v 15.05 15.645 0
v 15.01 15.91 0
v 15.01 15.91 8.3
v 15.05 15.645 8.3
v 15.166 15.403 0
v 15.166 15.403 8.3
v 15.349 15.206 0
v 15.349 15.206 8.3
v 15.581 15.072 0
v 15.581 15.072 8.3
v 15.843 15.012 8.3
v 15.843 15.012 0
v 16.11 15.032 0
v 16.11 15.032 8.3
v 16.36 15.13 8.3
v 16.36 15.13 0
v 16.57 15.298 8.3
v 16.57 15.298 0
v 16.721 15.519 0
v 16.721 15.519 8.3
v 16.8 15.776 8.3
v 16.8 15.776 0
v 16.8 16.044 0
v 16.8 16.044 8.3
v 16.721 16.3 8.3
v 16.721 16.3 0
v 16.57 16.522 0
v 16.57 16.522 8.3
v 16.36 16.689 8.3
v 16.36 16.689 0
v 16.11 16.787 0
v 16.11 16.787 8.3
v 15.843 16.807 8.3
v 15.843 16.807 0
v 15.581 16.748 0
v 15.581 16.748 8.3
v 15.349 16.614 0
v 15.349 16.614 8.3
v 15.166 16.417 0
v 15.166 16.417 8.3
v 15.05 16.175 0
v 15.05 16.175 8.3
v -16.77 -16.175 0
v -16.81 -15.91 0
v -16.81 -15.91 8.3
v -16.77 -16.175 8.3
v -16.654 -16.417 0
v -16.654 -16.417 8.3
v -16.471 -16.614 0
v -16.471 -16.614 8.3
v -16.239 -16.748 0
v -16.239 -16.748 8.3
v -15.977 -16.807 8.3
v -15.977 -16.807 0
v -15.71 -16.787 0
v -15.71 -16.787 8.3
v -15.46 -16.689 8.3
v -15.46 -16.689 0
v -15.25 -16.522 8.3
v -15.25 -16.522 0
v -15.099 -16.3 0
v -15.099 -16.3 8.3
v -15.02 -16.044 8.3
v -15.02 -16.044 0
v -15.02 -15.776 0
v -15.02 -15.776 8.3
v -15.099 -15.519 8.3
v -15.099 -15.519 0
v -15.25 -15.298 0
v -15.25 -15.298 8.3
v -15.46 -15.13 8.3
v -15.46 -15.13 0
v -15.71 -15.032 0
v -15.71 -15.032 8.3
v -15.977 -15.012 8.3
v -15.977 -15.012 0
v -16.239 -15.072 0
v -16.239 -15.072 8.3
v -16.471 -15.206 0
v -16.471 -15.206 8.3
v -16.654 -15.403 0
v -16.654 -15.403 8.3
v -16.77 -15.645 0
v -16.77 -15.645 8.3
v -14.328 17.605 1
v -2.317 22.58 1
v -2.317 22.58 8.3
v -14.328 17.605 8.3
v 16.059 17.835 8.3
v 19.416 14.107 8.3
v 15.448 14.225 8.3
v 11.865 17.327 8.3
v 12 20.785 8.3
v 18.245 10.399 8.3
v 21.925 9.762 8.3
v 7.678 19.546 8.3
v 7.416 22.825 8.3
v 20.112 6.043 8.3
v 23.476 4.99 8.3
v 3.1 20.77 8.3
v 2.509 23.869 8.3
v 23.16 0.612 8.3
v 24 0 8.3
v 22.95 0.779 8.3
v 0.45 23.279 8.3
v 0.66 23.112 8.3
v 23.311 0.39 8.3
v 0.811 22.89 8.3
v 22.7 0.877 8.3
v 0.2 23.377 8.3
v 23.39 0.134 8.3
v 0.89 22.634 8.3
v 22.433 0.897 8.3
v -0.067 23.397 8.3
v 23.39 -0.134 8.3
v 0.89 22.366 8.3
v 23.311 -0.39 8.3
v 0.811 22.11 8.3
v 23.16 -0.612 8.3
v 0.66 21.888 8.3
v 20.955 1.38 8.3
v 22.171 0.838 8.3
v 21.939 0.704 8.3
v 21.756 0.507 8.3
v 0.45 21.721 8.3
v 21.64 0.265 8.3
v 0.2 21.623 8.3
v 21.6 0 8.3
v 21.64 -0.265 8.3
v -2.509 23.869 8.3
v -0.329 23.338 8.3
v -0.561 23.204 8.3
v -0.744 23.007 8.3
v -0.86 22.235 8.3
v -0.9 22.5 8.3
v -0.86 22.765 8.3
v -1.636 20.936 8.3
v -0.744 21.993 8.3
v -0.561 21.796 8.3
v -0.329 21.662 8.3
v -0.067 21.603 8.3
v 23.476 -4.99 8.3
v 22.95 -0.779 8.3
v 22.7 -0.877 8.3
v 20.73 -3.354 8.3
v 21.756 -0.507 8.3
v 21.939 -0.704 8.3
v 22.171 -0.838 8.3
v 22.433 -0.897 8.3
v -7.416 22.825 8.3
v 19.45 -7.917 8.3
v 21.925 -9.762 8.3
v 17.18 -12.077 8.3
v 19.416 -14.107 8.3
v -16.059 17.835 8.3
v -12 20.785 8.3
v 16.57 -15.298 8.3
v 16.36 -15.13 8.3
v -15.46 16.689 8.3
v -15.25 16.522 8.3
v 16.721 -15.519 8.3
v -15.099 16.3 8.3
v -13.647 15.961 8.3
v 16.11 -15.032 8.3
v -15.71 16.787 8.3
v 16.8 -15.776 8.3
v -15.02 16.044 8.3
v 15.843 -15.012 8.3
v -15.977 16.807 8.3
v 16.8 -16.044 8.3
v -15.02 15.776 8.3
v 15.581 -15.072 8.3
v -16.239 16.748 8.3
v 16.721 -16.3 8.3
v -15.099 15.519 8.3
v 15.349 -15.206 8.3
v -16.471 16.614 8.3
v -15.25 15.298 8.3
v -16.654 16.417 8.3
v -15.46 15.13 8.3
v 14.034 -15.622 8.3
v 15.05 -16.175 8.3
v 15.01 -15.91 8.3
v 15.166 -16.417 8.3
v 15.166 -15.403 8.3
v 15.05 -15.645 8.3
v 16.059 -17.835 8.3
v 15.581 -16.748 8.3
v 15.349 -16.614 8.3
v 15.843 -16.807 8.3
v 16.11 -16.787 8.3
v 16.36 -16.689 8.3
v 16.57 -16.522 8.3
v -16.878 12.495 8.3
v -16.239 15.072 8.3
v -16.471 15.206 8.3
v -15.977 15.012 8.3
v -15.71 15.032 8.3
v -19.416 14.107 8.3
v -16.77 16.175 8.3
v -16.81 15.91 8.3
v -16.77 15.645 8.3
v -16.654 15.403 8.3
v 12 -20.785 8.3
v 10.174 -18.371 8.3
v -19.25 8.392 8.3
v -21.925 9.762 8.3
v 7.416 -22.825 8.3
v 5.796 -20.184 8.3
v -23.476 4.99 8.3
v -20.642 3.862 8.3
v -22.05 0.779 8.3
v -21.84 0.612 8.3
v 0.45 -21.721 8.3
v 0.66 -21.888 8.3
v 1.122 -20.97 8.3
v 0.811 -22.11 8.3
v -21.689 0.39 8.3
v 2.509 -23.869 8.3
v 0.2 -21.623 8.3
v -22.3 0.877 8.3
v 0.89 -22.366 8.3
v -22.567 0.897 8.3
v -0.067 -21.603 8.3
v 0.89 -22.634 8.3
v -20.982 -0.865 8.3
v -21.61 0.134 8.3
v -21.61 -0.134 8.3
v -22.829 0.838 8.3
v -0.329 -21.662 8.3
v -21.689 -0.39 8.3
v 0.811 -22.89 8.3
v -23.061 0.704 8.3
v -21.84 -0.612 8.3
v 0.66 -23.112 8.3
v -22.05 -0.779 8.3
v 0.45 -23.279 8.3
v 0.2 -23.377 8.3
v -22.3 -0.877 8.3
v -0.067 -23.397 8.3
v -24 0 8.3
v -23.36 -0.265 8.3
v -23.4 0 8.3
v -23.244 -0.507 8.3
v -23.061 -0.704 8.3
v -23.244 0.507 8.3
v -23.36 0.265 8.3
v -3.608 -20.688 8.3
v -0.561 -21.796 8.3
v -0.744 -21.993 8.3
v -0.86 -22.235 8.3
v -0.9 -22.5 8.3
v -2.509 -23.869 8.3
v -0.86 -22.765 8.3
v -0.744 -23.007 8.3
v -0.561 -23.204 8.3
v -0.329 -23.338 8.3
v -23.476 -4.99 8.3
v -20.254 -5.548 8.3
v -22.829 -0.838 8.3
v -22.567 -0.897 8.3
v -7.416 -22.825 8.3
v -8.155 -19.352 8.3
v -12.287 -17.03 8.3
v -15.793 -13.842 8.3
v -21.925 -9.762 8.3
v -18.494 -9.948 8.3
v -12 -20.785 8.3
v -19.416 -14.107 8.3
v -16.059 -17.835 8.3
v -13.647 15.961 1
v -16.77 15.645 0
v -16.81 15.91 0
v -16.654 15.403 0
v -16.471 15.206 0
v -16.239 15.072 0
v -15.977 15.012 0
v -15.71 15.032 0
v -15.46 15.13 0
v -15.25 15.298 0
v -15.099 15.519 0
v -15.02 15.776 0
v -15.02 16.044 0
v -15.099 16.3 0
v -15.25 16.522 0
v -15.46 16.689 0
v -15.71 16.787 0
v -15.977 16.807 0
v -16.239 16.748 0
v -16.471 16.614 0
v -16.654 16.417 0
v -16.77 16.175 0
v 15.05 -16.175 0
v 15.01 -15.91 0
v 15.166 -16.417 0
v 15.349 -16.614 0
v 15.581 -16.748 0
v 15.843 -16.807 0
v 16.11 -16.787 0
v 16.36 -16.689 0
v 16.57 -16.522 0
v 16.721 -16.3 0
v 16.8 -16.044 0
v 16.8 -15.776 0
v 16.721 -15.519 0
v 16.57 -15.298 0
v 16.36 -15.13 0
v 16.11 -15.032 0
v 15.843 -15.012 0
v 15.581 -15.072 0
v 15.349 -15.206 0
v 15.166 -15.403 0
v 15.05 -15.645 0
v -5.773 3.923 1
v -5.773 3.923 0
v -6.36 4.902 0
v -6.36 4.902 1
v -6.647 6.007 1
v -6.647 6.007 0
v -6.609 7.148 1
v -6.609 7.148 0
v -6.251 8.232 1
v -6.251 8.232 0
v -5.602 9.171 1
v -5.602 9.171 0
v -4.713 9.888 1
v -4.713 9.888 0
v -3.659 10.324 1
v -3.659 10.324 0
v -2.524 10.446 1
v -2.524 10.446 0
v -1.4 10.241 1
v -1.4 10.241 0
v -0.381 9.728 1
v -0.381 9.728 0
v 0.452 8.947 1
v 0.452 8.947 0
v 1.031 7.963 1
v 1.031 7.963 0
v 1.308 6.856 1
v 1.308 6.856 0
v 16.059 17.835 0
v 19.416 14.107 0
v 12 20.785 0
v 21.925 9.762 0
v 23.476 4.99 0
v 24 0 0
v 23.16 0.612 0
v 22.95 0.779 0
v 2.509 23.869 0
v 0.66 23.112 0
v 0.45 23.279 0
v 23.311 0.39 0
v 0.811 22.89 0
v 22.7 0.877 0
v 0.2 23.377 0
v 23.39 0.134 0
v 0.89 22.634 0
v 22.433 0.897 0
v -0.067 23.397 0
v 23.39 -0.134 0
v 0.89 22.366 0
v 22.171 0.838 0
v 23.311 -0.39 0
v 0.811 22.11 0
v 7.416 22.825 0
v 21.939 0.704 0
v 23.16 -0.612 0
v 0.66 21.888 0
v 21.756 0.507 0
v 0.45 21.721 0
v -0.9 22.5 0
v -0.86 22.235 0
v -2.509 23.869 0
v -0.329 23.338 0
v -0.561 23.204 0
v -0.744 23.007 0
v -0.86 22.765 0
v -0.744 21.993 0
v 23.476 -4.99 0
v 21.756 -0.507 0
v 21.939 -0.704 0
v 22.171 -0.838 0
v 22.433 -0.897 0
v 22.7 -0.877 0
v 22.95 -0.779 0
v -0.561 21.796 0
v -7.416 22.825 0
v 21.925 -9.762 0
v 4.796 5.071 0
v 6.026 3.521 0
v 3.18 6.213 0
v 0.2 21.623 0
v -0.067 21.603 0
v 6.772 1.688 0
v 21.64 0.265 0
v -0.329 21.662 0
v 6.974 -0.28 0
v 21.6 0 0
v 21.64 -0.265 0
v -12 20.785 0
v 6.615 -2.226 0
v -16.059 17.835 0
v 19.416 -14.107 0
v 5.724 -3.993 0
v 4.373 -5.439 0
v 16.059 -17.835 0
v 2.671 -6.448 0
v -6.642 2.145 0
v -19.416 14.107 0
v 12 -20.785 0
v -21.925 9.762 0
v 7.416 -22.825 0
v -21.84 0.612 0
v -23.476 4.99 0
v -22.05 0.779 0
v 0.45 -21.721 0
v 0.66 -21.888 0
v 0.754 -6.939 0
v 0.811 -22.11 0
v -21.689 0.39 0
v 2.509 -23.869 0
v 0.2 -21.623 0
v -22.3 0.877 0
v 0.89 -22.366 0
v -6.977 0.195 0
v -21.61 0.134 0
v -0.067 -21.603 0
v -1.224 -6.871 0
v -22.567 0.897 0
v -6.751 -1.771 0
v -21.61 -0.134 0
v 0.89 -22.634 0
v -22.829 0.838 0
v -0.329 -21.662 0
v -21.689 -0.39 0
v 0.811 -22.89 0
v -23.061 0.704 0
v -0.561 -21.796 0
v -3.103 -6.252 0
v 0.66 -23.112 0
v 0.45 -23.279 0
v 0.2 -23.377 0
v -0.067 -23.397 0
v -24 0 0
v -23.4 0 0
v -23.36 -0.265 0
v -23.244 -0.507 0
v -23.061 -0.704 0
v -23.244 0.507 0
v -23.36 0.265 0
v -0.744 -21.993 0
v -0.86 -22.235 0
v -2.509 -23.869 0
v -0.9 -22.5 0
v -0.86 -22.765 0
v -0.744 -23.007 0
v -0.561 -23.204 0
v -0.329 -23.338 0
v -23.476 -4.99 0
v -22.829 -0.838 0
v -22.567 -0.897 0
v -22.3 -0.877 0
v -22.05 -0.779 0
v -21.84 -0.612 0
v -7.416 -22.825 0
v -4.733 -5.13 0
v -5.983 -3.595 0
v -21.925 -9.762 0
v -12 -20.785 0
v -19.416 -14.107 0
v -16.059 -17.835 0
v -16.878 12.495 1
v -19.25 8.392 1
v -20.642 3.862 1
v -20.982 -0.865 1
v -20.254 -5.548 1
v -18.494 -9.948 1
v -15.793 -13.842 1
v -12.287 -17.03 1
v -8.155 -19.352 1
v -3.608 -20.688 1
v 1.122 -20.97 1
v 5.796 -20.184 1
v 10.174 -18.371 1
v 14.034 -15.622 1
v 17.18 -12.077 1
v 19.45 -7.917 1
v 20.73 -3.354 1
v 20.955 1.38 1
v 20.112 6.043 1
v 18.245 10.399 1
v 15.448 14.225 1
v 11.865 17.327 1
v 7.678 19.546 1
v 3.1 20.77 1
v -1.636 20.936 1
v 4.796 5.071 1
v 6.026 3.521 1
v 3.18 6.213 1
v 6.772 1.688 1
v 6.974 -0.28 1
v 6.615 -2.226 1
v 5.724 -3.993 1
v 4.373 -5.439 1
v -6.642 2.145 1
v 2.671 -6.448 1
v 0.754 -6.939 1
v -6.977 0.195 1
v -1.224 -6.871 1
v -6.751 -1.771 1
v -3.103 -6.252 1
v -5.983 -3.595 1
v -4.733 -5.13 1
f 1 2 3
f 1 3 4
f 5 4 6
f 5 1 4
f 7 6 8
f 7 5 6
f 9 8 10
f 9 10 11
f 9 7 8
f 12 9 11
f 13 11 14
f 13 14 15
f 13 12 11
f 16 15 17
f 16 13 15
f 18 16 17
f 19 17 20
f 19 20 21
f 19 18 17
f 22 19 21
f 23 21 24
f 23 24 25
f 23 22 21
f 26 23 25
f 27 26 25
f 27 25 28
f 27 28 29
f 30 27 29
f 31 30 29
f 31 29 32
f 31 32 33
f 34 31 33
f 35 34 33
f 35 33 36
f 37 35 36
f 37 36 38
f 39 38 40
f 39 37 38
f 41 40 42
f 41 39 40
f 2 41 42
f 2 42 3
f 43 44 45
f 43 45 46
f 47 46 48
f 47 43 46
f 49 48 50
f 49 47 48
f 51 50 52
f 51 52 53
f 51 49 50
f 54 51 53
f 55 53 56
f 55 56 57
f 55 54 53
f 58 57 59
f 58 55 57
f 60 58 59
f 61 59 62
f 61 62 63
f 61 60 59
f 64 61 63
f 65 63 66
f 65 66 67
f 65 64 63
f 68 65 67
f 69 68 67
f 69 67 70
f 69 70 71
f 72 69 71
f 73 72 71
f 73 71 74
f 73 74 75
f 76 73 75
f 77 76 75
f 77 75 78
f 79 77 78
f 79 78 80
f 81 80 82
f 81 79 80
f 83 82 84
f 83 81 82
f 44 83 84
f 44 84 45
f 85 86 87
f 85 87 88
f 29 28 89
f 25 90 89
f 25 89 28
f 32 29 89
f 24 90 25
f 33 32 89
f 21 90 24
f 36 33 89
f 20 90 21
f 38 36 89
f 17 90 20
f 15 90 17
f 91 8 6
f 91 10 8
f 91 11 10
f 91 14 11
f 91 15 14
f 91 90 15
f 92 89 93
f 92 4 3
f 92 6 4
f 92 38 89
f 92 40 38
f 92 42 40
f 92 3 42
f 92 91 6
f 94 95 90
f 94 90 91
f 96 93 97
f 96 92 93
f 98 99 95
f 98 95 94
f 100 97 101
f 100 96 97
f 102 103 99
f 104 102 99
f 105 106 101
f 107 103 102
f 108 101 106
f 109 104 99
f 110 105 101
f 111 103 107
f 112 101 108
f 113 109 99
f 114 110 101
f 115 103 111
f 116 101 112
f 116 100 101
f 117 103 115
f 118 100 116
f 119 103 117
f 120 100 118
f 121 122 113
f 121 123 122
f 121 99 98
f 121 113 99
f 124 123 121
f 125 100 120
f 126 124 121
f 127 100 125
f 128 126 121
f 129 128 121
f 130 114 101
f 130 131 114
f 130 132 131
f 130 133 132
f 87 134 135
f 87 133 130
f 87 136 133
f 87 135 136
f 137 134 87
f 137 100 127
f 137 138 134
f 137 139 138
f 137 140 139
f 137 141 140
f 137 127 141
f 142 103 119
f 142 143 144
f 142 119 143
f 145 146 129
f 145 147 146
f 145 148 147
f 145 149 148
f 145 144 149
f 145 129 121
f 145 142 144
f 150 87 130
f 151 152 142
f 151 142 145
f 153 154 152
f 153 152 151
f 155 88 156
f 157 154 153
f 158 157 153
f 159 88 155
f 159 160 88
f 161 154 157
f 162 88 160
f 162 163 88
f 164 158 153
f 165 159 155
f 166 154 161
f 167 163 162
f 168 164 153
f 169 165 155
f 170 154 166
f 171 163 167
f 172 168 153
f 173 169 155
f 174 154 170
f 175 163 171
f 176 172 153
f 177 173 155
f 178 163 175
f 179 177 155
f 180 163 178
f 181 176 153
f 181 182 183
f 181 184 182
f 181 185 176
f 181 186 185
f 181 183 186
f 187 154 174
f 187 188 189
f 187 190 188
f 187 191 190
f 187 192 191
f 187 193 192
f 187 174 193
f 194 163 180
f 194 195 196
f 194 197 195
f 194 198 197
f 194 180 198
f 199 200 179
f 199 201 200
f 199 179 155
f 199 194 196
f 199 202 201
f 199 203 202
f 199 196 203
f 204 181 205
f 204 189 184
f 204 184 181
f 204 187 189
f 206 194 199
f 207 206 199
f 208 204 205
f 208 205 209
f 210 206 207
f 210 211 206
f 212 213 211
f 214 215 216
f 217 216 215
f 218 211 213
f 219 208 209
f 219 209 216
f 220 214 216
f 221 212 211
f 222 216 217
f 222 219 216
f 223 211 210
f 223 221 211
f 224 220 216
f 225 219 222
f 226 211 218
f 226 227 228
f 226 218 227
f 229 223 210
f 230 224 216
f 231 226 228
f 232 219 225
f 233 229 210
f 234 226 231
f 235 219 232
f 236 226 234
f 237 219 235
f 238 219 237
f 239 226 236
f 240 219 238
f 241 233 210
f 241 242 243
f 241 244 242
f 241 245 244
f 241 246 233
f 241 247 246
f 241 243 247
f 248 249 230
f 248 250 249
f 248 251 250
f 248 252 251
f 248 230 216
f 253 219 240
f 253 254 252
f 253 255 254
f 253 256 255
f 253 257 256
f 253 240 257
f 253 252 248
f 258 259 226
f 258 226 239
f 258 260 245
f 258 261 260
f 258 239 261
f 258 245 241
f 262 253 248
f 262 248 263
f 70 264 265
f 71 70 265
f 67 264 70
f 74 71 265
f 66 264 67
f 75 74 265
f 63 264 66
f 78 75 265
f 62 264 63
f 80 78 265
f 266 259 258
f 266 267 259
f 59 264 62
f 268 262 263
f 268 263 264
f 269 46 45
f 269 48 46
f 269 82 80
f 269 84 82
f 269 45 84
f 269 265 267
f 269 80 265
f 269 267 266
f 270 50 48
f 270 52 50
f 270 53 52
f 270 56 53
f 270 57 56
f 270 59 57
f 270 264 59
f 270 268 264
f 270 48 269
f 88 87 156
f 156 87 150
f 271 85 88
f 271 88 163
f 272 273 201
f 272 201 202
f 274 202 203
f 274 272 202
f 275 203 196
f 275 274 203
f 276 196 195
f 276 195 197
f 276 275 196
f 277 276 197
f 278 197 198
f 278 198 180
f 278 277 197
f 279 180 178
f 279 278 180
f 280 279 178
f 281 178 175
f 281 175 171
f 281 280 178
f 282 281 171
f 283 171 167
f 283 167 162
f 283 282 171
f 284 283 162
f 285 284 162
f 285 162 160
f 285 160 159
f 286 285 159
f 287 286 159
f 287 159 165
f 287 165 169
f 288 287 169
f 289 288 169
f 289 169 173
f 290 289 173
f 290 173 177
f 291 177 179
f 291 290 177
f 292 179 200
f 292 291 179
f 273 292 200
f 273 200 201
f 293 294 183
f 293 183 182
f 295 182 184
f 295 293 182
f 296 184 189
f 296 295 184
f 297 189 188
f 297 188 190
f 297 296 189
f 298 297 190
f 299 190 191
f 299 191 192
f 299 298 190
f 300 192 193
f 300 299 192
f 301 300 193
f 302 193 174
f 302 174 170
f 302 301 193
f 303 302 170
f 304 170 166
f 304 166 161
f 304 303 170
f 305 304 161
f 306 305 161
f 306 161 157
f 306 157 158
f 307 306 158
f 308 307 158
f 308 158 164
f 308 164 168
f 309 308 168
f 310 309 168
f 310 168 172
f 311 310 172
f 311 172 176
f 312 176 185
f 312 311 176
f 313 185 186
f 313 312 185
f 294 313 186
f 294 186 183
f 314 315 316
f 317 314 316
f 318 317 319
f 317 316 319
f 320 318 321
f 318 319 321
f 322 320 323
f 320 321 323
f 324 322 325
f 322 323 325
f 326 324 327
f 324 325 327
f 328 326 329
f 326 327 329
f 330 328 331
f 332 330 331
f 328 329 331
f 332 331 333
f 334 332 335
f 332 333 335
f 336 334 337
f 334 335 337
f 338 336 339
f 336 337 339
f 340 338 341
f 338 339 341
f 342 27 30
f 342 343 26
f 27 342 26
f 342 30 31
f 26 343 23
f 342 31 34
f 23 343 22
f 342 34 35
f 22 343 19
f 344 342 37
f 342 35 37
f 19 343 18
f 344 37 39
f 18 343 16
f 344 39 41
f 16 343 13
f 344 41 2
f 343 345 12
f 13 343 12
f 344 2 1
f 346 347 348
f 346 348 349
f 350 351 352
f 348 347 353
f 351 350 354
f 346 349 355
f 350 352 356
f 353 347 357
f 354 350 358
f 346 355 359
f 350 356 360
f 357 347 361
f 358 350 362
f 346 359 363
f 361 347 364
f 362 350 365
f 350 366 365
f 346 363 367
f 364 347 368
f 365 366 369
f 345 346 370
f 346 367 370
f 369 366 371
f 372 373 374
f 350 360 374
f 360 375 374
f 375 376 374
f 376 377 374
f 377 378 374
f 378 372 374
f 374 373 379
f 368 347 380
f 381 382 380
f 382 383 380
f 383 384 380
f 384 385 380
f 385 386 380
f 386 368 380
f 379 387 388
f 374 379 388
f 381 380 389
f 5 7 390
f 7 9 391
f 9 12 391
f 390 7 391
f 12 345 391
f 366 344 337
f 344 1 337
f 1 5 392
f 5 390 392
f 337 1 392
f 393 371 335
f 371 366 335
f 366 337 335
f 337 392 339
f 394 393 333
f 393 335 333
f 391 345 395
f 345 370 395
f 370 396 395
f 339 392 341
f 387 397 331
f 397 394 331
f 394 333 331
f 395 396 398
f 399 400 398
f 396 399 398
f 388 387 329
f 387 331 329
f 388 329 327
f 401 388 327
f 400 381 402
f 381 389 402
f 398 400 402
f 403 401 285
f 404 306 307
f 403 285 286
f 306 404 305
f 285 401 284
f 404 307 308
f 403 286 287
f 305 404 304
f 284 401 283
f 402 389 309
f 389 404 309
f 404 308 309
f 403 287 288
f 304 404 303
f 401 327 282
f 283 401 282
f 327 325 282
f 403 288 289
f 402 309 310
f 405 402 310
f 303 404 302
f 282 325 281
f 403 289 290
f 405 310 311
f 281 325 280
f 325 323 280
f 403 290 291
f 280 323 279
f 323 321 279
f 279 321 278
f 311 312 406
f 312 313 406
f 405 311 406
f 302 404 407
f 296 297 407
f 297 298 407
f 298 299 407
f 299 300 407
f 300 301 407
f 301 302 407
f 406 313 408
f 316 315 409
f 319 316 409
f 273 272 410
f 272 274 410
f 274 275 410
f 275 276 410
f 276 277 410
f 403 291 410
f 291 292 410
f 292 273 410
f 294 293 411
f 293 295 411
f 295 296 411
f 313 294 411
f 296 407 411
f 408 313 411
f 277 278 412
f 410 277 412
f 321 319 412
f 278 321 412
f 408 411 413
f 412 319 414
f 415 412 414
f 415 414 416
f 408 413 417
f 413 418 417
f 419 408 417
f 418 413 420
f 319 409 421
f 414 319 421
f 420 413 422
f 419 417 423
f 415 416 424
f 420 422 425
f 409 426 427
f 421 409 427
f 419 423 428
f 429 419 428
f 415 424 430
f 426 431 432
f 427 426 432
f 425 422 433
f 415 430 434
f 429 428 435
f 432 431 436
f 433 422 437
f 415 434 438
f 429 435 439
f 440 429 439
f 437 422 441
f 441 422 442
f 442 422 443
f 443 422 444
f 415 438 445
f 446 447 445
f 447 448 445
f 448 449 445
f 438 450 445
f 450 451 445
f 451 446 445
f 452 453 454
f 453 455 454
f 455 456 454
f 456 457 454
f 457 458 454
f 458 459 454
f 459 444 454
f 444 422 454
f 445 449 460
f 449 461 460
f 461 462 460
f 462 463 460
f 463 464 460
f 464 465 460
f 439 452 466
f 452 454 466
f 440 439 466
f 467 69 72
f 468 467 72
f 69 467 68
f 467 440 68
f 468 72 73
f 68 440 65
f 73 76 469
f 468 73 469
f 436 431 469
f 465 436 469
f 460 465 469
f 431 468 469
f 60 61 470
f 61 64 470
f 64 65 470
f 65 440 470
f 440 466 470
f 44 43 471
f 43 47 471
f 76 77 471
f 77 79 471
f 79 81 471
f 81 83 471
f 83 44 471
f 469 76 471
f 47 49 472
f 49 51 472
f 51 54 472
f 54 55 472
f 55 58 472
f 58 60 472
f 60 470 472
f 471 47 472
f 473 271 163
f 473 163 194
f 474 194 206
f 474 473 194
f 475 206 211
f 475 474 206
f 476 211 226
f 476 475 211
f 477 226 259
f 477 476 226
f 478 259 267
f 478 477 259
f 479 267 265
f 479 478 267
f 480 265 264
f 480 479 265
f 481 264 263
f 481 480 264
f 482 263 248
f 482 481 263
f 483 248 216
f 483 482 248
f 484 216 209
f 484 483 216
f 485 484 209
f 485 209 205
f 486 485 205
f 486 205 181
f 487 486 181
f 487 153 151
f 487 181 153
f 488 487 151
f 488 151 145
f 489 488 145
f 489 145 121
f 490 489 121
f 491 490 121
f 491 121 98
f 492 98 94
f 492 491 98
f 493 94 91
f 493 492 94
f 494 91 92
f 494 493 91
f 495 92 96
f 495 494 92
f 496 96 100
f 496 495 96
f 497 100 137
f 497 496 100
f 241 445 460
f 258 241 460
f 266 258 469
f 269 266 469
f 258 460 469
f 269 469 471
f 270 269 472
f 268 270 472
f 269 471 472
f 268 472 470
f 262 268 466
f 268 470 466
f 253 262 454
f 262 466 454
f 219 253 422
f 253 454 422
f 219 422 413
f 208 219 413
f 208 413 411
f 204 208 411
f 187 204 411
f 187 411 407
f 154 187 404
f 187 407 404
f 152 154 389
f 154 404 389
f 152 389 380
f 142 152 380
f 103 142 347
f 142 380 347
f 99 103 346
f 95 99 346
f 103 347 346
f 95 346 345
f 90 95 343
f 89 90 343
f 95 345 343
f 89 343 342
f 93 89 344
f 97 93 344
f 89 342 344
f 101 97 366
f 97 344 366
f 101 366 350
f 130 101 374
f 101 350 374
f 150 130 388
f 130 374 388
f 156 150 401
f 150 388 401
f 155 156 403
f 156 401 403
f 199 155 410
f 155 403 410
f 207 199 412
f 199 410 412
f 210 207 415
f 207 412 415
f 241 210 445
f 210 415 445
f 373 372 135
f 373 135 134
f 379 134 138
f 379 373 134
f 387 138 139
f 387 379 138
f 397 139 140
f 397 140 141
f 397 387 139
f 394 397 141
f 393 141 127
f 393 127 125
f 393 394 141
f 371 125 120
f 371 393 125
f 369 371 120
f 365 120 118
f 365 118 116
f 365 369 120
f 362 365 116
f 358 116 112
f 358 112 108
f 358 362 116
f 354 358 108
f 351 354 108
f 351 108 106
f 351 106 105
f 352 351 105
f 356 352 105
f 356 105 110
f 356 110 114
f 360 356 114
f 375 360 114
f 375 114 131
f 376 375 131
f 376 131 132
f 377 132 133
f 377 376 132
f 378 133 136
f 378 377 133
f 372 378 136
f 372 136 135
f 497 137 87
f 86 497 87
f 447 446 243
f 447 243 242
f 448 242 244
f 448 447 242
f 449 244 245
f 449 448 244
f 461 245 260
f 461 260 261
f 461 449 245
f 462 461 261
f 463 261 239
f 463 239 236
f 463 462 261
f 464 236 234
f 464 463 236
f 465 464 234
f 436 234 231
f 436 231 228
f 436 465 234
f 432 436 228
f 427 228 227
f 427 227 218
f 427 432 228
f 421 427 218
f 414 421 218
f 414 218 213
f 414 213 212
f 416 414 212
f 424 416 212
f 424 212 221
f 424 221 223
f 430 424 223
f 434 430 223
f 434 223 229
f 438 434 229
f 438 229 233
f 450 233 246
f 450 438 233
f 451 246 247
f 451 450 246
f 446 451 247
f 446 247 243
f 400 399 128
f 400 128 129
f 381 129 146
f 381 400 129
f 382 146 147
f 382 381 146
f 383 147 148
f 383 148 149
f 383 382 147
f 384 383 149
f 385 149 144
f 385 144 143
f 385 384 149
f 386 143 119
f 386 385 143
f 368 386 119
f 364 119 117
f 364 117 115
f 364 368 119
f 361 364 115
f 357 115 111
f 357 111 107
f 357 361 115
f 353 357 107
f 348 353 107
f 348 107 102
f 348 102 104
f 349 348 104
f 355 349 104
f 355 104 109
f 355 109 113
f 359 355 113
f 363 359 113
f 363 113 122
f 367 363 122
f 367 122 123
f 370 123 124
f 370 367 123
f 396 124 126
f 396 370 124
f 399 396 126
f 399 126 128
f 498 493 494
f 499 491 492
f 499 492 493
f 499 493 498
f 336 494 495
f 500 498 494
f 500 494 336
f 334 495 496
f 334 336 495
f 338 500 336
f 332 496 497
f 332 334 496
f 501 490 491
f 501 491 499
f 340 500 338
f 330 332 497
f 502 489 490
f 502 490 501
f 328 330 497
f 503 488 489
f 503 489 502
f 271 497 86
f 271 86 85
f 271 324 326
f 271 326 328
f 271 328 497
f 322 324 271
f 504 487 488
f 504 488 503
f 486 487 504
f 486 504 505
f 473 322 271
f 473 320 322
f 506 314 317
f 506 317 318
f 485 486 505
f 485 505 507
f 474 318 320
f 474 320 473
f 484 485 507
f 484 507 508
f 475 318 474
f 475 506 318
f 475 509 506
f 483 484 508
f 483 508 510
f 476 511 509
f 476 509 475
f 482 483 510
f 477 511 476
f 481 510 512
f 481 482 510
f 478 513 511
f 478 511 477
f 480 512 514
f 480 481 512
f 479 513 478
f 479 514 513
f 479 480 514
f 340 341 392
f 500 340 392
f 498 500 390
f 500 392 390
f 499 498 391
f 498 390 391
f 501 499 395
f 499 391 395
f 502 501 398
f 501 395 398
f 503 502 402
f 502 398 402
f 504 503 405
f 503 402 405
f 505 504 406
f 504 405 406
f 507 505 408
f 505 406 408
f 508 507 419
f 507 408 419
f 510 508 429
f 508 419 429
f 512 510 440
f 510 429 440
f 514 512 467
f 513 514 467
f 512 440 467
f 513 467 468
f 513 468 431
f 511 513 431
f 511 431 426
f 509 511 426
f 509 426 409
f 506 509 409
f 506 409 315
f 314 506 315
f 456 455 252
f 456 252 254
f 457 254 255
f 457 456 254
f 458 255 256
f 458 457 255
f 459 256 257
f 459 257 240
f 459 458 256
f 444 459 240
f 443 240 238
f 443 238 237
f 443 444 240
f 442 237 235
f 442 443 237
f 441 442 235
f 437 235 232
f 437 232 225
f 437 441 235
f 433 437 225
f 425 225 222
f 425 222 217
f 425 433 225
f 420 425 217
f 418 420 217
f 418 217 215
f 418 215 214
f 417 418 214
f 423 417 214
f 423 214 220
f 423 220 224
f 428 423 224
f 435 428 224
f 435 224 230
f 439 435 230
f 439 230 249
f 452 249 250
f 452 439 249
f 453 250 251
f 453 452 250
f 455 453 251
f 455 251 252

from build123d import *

# Parameters (mm, degrees)
ESQUISSE1_R             = 24
ESQUISSE1_R_2           = 21
ESQUISSE1_R_3           = 0.9
BOSS_EXTRU_1_DEPTH      = 8.3
ESQUISSE2_R             = 21
BOSS_EXTRU_2_DEPTH      = 1
ENL_V_MAT_EXTRU_1_DEPTH = 35.941236383
ENL_V_MAT_EXTRU_2_DEPTH = 35.71728676


with BuildPart() as part:
    # Esquisse1 → Boss.-Extru.1 (new body)
    with BuildSketch(Plane.XY):
        with Locations(Location((0, 0, 0), (0, 0, 180))):
            Circle(ESQUISSE1_R)
        with Locations(Location((0, 0, 0), (0, 0, 180))):
            Circle(ESQUISSE1_R_2, mode=Mode.SUBTRACT)
        with Locations(Location((22.5, 0, 0), (0, 0, 180))):
            Circle(ESQUISSE1_R_3, mode=Mode.SUBTRACT)
        with Locations(Location((15.909902577, -15.909902577, 0), (0, 0, 180))):
            Circle(ESQUISSE1_R_3, mode=Mode.SUBTRACT)
        with Locations(Location((0, -22.5, 0), (0, 0, 180))):
            Circle(ESQUISSE1_R_3, mode=Mode.SUBTRACT)
        with Locations(Location((-15.909902577, -15.909902577, 0), (0, 0, 180))):
            Circle(ESQUISSE1_R_3, mode=Mode.SUBTRACT)
        with Locations(Location((-22.5, 0, 0), (0, 0, 180))):
            Circle(ESQUISSE1_R_3, mode=Mode.SUBTRACT)
        with Locations(Location((-15.909902577, 15.909902577, 0), (0, 0, 180))):
            Circle(ESQUISSE1_R_3, mode=Mode.SUBTRACT)
        with Locations(Location((0, 22.5, 0), (0, 0, 180))):
            Circle(ESQUISSE1_R_3, mode=Mode.SUBTRACT)
        with Locations(Location((15.909902577, 15.909902577, 0), (0, 0, 180))):
            Circle(ESQUISSE1_R_3, mode=Mode.SUBTRACT)
    extrude(amount=BOSS_EXTRU_1_DEPTH)

    # Esquisse2 → Boss.-Extru.2 (add)
    with BuildSketch(Plane.XY):
        with Locations(Location((0, 0, 0), (0, 0, 180))):
            Circle(ESQUISSE2_R)
    extrude(amount=BOSS_EXTRU_2_DEPTH)

    # Esquisse5 → Enlèv. mat.-Extru.1 (cut, through all)
    with BuildSketch(Plane(origin=(0, 0, 0), x_dir=(-1, 0, 0), z_dir=(0, 0, -1))):
        with BuildLine():
            ThreePointArc((-1.30820243, 6.85590272), (-2.670976724, -6.448308231), (5.772894113, 3.922816495))
            ThreePointArc((5.772894113, 3.922816495), (4.201710453, 10.143826361), (-1.30820243, 6.85590272))
        make_face()
    extrude(amount=-ENL_V_MAT_EXTRU_1_DEPTH, mode=Mode.SUBTRACT)

    # Esquisse6 → Enlèv. mat.-Extru.2 (cut, through all)
    with BuildSketch(Plane.XY.offset(1)):
        Polygon((-2.317366162, 22.579935361), (-14.327800085, 17.60505074), (-11.237259755, 10.143826361), (0.773174168, 15.118710982), align=None)
    extrude(amount=ENL_V_MAT_EXTRU_2_DEPTH, mode=Mode.SUBTRACT)


solid = part.part
